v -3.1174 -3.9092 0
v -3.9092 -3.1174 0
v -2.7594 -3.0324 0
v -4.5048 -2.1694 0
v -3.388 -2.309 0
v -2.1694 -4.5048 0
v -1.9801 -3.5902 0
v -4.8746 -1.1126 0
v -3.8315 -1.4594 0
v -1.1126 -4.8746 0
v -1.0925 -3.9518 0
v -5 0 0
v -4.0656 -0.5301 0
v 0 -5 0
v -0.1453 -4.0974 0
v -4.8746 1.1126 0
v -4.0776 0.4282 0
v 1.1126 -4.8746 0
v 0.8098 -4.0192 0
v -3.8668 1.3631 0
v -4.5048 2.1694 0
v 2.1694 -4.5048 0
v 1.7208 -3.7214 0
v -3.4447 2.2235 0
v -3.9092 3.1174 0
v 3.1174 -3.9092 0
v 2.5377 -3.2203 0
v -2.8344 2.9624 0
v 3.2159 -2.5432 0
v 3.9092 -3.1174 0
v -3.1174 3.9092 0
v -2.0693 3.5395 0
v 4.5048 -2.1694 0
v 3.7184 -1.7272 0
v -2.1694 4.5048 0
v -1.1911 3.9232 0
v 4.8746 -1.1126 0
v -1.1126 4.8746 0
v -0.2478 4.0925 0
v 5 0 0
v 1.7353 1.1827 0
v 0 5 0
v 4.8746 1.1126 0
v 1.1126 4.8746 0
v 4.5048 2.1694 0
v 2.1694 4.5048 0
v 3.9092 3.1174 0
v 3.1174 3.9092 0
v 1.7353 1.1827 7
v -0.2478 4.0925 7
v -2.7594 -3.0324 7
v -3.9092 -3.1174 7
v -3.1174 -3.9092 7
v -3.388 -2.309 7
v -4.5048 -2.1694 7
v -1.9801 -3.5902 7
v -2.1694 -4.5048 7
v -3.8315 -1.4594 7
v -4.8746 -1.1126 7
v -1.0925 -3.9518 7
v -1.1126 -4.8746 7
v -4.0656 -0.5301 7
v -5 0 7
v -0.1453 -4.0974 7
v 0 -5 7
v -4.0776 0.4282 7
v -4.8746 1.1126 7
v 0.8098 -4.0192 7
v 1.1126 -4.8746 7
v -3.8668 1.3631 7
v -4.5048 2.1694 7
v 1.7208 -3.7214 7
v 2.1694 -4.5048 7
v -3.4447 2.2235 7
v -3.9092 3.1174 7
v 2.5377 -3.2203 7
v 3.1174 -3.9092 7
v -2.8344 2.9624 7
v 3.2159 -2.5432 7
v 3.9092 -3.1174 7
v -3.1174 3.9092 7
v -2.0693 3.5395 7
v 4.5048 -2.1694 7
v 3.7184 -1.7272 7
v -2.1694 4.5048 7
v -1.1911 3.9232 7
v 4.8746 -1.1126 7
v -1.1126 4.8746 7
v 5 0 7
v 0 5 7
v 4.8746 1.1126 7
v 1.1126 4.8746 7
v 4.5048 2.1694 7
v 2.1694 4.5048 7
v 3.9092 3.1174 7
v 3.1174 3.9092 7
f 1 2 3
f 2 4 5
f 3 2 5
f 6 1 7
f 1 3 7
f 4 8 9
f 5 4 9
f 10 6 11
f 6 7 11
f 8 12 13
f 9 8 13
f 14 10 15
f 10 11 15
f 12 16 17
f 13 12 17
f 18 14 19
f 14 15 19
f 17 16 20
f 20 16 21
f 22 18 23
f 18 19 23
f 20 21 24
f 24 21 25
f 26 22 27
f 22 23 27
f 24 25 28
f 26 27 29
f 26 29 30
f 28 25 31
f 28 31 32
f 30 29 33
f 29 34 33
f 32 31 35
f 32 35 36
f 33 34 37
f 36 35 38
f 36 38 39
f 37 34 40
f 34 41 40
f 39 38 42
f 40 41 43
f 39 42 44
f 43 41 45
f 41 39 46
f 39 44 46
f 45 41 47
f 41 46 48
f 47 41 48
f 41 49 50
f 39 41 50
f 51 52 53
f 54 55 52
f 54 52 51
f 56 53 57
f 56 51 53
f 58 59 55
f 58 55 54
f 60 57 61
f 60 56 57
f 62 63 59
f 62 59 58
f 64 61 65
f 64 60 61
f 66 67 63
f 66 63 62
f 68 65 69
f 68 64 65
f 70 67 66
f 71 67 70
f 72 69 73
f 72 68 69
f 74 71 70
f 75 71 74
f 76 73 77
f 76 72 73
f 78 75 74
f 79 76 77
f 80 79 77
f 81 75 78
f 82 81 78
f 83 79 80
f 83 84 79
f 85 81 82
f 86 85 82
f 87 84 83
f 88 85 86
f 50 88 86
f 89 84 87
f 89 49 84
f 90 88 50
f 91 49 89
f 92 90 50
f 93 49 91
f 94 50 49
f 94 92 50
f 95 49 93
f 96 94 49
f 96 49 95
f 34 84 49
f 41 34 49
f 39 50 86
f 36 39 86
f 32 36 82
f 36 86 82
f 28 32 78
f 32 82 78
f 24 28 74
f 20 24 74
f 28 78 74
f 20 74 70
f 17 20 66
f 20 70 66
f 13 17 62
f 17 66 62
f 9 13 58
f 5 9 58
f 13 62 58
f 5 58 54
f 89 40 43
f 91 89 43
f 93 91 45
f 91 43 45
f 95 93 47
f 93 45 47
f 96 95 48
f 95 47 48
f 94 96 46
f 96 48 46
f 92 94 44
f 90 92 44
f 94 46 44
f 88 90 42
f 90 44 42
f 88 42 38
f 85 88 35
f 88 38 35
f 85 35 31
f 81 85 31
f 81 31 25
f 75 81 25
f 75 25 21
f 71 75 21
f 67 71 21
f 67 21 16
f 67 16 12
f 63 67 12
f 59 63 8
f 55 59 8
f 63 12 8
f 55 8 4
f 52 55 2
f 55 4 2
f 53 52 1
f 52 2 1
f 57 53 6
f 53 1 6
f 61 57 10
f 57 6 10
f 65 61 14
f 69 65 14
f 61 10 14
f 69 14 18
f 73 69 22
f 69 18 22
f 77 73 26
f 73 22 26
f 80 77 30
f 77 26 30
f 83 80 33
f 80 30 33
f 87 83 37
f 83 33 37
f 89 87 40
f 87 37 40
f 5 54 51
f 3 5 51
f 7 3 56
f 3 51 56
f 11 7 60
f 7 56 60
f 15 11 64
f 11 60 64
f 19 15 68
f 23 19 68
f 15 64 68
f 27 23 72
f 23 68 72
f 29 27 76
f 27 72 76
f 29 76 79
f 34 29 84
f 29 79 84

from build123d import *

# Parameters (mm, degrees)
F0_R     = 5
F1_DEPTH = 7
F3_DEPTH = 7.001


with BuildPart() as f1:
    # F0 (on Top) → F1 (new body)
    with BuildSketch(Plane.XY):
        Circle(F0_R)
    extrude(amount=F1_DEPTH)

    # F2 (on face) → F3 (cut, through all)
    with BuildSketch(Plane.XY.offset(7)):
        with BuildLine():
            Line((1.735315, 1.182659), (-0.247815, 4.092504))
            ThreePointArc((-0.247815, 4.092504), (-3.680977, 1.805659), (-3.387996, -2.309001))
            Line((-3.387996, -2.309001), (1.735315, 1.182659))
        make_face()
        with BuildLine():
            ThreePointArc((-3.387996, -2.309001), (0.334554, -4.086328), (3.718444, -1.727186))
            Line((3.718444, -1.727186), (1.735315, 1.182659))
            Line((1.735315, 1.182659), (-3.387996, -2.309001))
        make_face()
    extrude(amount=-F3_DEPTH, mode=Mode.SUBTRACT)


solid = f1.part
